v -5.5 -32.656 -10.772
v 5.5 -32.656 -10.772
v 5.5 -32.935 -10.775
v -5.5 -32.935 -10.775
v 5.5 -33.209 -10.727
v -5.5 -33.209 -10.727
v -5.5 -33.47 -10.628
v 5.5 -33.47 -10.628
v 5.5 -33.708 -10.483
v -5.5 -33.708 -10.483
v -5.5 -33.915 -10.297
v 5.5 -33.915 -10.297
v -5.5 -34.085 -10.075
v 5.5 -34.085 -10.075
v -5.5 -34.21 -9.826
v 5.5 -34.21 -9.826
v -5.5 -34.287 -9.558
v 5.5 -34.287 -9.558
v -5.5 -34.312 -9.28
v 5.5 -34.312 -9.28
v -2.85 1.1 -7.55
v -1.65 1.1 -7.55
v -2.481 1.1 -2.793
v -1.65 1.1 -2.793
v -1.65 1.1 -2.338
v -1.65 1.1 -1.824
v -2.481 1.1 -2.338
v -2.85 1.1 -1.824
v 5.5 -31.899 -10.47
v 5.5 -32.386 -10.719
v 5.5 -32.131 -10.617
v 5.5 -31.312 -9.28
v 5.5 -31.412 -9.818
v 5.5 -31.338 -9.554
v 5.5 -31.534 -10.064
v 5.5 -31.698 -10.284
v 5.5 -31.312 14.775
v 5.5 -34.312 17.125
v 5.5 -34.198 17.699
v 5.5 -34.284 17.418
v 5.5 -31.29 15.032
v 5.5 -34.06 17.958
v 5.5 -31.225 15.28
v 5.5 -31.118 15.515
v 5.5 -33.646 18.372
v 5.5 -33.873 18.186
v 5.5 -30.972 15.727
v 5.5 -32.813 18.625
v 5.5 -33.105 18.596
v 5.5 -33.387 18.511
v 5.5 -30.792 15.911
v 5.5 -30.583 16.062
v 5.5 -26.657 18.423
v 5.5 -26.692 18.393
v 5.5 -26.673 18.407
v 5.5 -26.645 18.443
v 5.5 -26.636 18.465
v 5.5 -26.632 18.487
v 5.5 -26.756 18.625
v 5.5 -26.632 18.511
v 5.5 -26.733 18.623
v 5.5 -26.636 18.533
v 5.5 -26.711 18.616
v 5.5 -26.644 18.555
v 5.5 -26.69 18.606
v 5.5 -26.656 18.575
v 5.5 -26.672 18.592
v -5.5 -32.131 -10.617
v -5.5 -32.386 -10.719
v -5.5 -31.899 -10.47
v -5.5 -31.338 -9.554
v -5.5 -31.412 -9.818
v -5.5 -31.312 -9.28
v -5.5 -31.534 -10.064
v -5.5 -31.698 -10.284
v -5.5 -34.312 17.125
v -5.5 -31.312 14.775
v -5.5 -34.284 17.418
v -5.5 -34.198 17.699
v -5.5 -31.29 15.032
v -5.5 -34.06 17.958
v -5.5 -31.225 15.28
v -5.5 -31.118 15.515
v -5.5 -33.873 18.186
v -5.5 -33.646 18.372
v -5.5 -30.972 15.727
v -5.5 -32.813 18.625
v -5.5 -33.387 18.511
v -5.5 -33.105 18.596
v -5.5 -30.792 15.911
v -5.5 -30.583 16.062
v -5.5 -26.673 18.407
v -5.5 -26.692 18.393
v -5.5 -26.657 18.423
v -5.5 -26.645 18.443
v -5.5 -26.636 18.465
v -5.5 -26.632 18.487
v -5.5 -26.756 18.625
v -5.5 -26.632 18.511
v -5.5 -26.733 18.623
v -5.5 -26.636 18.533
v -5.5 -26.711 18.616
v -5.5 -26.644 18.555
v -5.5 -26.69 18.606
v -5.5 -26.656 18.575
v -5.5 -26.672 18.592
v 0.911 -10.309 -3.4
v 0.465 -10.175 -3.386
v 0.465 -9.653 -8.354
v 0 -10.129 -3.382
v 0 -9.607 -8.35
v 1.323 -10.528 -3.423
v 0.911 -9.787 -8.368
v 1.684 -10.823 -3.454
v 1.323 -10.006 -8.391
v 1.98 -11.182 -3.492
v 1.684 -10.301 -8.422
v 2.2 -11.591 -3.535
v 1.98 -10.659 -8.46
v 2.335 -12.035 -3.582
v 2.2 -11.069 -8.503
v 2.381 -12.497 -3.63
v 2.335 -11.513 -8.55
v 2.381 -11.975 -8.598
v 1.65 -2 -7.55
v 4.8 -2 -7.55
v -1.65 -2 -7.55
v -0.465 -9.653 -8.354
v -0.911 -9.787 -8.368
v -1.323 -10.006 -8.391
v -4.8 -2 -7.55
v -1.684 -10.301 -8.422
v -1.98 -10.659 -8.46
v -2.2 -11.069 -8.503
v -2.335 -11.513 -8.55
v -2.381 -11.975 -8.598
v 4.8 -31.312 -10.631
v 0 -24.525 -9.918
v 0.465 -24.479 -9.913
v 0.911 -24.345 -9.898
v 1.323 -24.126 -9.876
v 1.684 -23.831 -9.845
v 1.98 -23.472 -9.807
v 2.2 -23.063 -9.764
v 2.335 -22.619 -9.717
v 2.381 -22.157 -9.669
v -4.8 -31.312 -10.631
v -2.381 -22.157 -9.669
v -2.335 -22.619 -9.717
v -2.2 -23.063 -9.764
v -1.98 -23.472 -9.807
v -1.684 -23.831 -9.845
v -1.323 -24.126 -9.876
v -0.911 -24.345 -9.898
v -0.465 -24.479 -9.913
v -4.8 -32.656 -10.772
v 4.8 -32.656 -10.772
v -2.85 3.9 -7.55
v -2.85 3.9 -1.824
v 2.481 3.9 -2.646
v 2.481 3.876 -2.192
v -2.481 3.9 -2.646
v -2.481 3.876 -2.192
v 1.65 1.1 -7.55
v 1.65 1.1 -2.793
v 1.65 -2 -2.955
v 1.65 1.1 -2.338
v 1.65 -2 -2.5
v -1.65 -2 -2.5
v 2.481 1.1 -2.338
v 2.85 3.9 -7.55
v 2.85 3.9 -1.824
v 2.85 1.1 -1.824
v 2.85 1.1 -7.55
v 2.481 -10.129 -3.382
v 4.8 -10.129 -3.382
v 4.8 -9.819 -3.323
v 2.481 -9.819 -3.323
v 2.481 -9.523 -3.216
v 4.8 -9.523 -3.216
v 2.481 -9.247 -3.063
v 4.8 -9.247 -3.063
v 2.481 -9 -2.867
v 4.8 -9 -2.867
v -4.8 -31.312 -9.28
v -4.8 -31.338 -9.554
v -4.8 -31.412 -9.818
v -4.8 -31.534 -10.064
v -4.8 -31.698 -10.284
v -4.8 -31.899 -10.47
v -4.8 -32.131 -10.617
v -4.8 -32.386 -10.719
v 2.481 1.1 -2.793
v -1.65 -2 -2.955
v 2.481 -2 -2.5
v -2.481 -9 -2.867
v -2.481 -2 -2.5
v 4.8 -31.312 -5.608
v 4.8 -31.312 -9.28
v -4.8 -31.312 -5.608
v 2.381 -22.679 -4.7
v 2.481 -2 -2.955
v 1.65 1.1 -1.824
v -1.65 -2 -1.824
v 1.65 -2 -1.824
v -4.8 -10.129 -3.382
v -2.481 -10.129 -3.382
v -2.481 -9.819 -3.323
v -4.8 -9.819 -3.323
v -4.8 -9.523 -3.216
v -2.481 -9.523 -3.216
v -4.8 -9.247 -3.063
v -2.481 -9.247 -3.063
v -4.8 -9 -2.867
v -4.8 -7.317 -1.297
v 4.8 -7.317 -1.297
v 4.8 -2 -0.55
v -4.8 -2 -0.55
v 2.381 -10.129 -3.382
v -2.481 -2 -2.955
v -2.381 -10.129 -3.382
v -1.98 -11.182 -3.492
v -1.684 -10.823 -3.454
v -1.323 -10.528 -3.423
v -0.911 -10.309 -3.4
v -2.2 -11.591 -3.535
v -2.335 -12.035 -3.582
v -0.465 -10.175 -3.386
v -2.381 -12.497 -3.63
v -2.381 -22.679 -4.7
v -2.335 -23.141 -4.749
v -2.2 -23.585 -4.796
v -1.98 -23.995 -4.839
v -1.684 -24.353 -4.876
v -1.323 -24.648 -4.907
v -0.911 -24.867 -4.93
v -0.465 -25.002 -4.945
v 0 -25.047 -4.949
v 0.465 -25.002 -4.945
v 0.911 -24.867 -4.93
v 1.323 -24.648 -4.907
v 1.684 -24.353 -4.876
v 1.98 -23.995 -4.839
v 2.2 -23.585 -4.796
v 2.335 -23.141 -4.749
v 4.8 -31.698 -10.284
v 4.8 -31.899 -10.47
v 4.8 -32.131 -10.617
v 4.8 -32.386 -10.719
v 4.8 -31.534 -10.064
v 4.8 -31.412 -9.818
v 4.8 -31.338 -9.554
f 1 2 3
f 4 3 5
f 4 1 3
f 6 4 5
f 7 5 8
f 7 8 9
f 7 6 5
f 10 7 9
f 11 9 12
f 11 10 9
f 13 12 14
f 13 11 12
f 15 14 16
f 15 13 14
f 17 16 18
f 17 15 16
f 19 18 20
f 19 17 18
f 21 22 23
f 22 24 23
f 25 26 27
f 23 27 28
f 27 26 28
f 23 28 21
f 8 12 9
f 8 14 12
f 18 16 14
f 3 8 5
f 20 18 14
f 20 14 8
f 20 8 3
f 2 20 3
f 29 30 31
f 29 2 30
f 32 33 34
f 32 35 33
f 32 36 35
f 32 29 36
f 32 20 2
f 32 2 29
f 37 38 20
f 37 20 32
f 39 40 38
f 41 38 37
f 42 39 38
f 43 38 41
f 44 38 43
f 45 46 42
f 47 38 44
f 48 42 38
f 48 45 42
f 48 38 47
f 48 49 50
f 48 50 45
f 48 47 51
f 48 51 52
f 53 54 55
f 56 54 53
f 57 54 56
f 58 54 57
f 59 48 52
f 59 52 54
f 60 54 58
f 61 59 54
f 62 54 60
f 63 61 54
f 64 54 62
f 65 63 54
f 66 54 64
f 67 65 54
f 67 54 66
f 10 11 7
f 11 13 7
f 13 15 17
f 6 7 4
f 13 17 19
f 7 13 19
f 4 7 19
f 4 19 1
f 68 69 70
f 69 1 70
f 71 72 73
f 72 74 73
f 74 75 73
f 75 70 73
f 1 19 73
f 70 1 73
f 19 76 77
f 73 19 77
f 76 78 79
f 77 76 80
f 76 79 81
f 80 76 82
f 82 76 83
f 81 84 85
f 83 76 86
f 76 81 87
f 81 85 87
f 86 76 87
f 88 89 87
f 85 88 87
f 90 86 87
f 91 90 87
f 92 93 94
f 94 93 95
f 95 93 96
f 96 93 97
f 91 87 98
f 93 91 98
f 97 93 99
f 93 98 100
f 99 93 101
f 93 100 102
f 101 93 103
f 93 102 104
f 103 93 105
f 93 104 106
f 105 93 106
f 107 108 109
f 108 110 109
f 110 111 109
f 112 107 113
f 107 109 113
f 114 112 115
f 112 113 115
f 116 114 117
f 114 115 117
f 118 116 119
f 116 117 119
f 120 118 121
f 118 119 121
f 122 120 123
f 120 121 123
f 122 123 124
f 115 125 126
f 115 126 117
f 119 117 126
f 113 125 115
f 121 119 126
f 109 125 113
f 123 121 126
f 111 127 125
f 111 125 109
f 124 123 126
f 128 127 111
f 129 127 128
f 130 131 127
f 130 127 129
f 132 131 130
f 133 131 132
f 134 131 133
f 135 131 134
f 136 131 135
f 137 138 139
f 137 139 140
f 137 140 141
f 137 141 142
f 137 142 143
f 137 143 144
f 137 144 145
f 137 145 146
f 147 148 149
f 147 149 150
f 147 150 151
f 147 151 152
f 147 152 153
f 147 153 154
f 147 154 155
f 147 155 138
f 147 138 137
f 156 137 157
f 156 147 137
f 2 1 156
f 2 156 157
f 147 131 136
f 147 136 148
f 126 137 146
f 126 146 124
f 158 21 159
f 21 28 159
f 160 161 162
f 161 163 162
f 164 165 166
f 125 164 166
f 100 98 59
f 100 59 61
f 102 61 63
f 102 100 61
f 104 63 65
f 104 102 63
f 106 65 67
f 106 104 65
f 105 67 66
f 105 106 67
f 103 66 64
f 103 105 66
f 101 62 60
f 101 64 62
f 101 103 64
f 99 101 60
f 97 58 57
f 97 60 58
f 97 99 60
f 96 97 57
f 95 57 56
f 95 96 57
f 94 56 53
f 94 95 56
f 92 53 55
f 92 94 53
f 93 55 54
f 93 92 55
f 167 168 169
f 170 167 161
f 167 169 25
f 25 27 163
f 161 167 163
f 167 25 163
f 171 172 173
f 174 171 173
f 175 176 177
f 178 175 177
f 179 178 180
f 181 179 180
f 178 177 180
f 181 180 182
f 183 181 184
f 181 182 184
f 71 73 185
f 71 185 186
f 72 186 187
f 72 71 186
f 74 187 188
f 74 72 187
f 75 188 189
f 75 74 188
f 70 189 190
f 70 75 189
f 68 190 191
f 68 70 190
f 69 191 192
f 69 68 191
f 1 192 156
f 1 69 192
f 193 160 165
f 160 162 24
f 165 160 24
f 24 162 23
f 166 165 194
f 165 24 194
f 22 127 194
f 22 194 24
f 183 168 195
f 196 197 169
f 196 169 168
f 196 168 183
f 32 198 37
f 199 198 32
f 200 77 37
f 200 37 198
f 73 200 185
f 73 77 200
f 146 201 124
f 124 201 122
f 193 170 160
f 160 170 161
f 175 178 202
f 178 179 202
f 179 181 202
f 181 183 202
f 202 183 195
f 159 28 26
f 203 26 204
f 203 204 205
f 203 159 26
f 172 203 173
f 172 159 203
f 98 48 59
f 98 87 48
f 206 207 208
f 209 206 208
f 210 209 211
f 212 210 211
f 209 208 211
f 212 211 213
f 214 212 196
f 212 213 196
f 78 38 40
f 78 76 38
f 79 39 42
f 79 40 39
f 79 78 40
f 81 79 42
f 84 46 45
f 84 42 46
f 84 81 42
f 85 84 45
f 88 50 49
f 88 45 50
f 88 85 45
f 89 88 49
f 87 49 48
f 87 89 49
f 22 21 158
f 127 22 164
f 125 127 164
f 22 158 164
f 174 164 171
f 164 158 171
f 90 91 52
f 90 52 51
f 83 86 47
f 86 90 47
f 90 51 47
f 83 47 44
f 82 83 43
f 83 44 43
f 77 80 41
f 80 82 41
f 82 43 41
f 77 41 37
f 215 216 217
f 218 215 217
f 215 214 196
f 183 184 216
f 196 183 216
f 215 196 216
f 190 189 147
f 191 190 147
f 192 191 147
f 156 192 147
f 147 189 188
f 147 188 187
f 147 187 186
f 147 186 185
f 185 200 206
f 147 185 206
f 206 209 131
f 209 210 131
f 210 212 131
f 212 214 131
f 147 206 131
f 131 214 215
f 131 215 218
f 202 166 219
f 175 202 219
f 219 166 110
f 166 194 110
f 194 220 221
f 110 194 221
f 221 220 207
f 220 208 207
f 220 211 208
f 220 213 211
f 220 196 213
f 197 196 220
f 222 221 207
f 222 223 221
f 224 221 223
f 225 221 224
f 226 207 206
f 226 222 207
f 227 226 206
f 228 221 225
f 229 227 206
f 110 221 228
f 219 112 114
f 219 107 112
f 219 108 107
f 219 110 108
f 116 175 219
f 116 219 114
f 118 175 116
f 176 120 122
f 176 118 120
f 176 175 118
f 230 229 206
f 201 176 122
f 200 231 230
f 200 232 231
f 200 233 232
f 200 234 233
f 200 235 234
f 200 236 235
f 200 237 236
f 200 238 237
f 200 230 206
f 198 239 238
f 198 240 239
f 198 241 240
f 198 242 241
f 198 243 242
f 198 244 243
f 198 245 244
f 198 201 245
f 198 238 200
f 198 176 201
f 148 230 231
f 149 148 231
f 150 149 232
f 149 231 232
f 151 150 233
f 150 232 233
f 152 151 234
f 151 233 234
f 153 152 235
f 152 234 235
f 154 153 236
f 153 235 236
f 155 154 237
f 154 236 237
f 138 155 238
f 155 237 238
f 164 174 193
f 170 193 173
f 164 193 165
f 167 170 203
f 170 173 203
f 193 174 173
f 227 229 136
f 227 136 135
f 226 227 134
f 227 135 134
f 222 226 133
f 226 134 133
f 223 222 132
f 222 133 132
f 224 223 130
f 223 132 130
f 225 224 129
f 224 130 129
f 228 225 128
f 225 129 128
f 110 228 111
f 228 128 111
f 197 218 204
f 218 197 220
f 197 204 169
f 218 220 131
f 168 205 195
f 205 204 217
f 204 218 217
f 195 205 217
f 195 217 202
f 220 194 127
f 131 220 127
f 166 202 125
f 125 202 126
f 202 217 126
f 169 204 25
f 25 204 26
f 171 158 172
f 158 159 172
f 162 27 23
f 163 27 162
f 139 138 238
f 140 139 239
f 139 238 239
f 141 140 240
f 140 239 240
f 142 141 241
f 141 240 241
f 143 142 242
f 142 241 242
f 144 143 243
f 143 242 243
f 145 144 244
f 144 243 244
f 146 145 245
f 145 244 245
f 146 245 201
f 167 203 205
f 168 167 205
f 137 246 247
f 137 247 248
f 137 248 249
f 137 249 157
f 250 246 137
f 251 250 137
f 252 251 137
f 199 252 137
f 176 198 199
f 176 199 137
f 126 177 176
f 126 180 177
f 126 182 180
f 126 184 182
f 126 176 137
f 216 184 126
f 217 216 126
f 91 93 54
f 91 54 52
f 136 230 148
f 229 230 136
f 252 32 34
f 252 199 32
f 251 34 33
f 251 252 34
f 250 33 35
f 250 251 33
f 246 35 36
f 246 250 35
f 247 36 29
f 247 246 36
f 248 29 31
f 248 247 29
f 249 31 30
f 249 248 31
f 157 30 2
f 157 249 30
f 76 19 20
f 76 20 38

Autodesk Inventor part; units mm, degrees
ref_plane "YZ Plane" through (0, 0, 0) normal (1, 0, 0) x (0, 1, 0)
ref_plane "XZ Plane" through (0, 0, 0) normal (0, 1, 0) x (-1, 0, 0)
ref_plane "Neck Start Plane" through (0, 0, -1.8245) normal (0, 0, 1) x (1, 0, 0)
sketch "Arm Profile" plane through (0, 0, 0) normal (1, 0, 0) x (0, 1, 0)
  line L0 (-2, -0.55) -> (-2, -7.55)
  line L1 (-2, -7.55) -> (-34.3125, -10.9462)
  line L2 (-34.3125, 18.625) -> (-26.7563, 18.625)
  line L3 (-26.692, 18.3928) -> (-31.3125, 15.625)
  arc A0 (-26.692, 18.3928) -> (-26.7563, 18.625) centre (-26.7563, 18.5) ccw
  line L4 (0, 0) -> (-30.5125, 0) construction
  line L5 (-30.5125, 0) -> (-31.3125, 0) construction
  line L6 (-2, -2.9554) -> (-10.1292, -3.3815)
  line L7 (-2, -2.5) -> (-9, -2.8669)
  line L8 (-9, -2.8669) -> (-7.3168, -1.2972)
  line L9 (-7.3168, -1.2972) -> (-2, -0.55)
  line L10 (-10.1292, -3.3815) -> (-31.3125, -5.6079)
  arc A1 (-10.1292, -3.3815) -> (-9, -2.8669) centre (-10.3336, -1.4368) ccw
  line L11 (-2, -2.5) -> (3.8762, -2.192)
  line L12 (3.8762, -2.192) -> (3.9, -2.6462)
  line L13 (3.9, -2.6462) -> (-2, -2.9554)
  line L14 (-31.3125, -5.6079) -> (-31.3125, 15.625)
  line L15 (-34.3125, -10.9462) -> (-34.3125, 18.625)
  line L16 (-31.3125, -5.6079) -> (-31.3125, -10.6309)
  line L17 (-24.5249, -9.9175) -> (-25.047, -4.9494)
  line L18 (-10.1292, -3.3815) -> (-9.607, -8.3495)
  point P0 (-7.4117, -1.3306)
  dimension "d0" = 0.125
  dimension "d1" = 26.7563
  dimension "d2" = 18.5
  dimension "d7" = 3
  dimension "d85" = 2
  dimension "neckDepth" = 7
  dimension "d119" = 30.5125
  dimension "d121" = 0.55
  dimension "d129" = 0.4548
  dimension "d132" = 8
  dimension "d136" = 145
  dimension "d137" = 7
  dimension "d138" = 5.9
  dimension "pincherArmThick" = 3
  dimension "d141" = 0.8
  dimension "d147" = 15
  dimension "d148" = 6
  dimension "d151" = 177
  dimension "d153" = 2.5
extrude "Main Arm" add sketch "Arm Profile" along normal mid plane 9.6 contours L0 L7 L8 L9 | L0 L6 A1 L7 | L0 L1 L18 L6 | L18 L1 L17 L10 | L17 L1 L16 L10
extrude "Pincher" add sketch "Arm Profile" along normal mid plane 11 contours L16 L1 L15 L2 A0 L3 L14
sketch "Neck Sketch" plane through (0, 0, -1.8245) normal (0, 0, 1) x (1, 0, 0)
  line L0 (-1.65, -2) -> (-1.65, 1.1)
  line L1 (-2.85, 3.9) -> (2.85, 3.9)
  line L2 (1.65, 1.1) -> (1.65, -2)
  line L3 (0, -2) -> (0, 3.9) construction
  line L4 (-1.65, 1.1) -> (-2.85, 1.1)
  line L5 (-2.85, 1.1) -> (-2.85, 3.9)
  line L6 (2.85, 3.9) -> (2.85, 1.1)
  line L7 (2.85, 1.1) -> (1.65, 1.1)
  line L8 (1.65, -2) -> (-1.65, -2)
  point P0 (0, 0)
  dimension "neckWidth" = 3.3
  dimension "headWidth" = 5.7
  dimension "headHeight" = 2.8
  dimension "d91" = 2
  dimension "d103" = 1.1
  dimension "neckHeight" = 5.9
extrude "Neck" add sketch "Neck Sketch" against normal blind 5.7255
extrude "Spring Steel Slot" cut sketch "Arm Profile" along normal mid plane 4.9625 contours L11 L12 L13 L0 | L0 L6 A1 L7
extrude "Viewport" cut sketch "Arm Profile" along normal mid plane 4.7625 contours L18 L1 L17 L10
fillet "Fillet1" radius 1.5 5 edges at (-5.15, -31.3125, -10.6309) (5.15, -31.3125, -10.6309) (0, -34.3125, -10.9462) (0, -31.3125, 15.625) (0, -34.3125, 18.625)
fillet "Fillet2" radius 2.3813 4 edges at (-2.3813, -24.7859, -7.4334) (2.3813, -24.7859, -7.4334) (2.3813, -9.8681, -5.8655) (-2.3813, -9.8681, -5.8655)
equation "\"d2\" = hingeToPincherHoriz"
equation "\"spacing\" = 1"
equation "\"hingeToPincherHoriz\" = 18.5"
properties part number "Lever1"
